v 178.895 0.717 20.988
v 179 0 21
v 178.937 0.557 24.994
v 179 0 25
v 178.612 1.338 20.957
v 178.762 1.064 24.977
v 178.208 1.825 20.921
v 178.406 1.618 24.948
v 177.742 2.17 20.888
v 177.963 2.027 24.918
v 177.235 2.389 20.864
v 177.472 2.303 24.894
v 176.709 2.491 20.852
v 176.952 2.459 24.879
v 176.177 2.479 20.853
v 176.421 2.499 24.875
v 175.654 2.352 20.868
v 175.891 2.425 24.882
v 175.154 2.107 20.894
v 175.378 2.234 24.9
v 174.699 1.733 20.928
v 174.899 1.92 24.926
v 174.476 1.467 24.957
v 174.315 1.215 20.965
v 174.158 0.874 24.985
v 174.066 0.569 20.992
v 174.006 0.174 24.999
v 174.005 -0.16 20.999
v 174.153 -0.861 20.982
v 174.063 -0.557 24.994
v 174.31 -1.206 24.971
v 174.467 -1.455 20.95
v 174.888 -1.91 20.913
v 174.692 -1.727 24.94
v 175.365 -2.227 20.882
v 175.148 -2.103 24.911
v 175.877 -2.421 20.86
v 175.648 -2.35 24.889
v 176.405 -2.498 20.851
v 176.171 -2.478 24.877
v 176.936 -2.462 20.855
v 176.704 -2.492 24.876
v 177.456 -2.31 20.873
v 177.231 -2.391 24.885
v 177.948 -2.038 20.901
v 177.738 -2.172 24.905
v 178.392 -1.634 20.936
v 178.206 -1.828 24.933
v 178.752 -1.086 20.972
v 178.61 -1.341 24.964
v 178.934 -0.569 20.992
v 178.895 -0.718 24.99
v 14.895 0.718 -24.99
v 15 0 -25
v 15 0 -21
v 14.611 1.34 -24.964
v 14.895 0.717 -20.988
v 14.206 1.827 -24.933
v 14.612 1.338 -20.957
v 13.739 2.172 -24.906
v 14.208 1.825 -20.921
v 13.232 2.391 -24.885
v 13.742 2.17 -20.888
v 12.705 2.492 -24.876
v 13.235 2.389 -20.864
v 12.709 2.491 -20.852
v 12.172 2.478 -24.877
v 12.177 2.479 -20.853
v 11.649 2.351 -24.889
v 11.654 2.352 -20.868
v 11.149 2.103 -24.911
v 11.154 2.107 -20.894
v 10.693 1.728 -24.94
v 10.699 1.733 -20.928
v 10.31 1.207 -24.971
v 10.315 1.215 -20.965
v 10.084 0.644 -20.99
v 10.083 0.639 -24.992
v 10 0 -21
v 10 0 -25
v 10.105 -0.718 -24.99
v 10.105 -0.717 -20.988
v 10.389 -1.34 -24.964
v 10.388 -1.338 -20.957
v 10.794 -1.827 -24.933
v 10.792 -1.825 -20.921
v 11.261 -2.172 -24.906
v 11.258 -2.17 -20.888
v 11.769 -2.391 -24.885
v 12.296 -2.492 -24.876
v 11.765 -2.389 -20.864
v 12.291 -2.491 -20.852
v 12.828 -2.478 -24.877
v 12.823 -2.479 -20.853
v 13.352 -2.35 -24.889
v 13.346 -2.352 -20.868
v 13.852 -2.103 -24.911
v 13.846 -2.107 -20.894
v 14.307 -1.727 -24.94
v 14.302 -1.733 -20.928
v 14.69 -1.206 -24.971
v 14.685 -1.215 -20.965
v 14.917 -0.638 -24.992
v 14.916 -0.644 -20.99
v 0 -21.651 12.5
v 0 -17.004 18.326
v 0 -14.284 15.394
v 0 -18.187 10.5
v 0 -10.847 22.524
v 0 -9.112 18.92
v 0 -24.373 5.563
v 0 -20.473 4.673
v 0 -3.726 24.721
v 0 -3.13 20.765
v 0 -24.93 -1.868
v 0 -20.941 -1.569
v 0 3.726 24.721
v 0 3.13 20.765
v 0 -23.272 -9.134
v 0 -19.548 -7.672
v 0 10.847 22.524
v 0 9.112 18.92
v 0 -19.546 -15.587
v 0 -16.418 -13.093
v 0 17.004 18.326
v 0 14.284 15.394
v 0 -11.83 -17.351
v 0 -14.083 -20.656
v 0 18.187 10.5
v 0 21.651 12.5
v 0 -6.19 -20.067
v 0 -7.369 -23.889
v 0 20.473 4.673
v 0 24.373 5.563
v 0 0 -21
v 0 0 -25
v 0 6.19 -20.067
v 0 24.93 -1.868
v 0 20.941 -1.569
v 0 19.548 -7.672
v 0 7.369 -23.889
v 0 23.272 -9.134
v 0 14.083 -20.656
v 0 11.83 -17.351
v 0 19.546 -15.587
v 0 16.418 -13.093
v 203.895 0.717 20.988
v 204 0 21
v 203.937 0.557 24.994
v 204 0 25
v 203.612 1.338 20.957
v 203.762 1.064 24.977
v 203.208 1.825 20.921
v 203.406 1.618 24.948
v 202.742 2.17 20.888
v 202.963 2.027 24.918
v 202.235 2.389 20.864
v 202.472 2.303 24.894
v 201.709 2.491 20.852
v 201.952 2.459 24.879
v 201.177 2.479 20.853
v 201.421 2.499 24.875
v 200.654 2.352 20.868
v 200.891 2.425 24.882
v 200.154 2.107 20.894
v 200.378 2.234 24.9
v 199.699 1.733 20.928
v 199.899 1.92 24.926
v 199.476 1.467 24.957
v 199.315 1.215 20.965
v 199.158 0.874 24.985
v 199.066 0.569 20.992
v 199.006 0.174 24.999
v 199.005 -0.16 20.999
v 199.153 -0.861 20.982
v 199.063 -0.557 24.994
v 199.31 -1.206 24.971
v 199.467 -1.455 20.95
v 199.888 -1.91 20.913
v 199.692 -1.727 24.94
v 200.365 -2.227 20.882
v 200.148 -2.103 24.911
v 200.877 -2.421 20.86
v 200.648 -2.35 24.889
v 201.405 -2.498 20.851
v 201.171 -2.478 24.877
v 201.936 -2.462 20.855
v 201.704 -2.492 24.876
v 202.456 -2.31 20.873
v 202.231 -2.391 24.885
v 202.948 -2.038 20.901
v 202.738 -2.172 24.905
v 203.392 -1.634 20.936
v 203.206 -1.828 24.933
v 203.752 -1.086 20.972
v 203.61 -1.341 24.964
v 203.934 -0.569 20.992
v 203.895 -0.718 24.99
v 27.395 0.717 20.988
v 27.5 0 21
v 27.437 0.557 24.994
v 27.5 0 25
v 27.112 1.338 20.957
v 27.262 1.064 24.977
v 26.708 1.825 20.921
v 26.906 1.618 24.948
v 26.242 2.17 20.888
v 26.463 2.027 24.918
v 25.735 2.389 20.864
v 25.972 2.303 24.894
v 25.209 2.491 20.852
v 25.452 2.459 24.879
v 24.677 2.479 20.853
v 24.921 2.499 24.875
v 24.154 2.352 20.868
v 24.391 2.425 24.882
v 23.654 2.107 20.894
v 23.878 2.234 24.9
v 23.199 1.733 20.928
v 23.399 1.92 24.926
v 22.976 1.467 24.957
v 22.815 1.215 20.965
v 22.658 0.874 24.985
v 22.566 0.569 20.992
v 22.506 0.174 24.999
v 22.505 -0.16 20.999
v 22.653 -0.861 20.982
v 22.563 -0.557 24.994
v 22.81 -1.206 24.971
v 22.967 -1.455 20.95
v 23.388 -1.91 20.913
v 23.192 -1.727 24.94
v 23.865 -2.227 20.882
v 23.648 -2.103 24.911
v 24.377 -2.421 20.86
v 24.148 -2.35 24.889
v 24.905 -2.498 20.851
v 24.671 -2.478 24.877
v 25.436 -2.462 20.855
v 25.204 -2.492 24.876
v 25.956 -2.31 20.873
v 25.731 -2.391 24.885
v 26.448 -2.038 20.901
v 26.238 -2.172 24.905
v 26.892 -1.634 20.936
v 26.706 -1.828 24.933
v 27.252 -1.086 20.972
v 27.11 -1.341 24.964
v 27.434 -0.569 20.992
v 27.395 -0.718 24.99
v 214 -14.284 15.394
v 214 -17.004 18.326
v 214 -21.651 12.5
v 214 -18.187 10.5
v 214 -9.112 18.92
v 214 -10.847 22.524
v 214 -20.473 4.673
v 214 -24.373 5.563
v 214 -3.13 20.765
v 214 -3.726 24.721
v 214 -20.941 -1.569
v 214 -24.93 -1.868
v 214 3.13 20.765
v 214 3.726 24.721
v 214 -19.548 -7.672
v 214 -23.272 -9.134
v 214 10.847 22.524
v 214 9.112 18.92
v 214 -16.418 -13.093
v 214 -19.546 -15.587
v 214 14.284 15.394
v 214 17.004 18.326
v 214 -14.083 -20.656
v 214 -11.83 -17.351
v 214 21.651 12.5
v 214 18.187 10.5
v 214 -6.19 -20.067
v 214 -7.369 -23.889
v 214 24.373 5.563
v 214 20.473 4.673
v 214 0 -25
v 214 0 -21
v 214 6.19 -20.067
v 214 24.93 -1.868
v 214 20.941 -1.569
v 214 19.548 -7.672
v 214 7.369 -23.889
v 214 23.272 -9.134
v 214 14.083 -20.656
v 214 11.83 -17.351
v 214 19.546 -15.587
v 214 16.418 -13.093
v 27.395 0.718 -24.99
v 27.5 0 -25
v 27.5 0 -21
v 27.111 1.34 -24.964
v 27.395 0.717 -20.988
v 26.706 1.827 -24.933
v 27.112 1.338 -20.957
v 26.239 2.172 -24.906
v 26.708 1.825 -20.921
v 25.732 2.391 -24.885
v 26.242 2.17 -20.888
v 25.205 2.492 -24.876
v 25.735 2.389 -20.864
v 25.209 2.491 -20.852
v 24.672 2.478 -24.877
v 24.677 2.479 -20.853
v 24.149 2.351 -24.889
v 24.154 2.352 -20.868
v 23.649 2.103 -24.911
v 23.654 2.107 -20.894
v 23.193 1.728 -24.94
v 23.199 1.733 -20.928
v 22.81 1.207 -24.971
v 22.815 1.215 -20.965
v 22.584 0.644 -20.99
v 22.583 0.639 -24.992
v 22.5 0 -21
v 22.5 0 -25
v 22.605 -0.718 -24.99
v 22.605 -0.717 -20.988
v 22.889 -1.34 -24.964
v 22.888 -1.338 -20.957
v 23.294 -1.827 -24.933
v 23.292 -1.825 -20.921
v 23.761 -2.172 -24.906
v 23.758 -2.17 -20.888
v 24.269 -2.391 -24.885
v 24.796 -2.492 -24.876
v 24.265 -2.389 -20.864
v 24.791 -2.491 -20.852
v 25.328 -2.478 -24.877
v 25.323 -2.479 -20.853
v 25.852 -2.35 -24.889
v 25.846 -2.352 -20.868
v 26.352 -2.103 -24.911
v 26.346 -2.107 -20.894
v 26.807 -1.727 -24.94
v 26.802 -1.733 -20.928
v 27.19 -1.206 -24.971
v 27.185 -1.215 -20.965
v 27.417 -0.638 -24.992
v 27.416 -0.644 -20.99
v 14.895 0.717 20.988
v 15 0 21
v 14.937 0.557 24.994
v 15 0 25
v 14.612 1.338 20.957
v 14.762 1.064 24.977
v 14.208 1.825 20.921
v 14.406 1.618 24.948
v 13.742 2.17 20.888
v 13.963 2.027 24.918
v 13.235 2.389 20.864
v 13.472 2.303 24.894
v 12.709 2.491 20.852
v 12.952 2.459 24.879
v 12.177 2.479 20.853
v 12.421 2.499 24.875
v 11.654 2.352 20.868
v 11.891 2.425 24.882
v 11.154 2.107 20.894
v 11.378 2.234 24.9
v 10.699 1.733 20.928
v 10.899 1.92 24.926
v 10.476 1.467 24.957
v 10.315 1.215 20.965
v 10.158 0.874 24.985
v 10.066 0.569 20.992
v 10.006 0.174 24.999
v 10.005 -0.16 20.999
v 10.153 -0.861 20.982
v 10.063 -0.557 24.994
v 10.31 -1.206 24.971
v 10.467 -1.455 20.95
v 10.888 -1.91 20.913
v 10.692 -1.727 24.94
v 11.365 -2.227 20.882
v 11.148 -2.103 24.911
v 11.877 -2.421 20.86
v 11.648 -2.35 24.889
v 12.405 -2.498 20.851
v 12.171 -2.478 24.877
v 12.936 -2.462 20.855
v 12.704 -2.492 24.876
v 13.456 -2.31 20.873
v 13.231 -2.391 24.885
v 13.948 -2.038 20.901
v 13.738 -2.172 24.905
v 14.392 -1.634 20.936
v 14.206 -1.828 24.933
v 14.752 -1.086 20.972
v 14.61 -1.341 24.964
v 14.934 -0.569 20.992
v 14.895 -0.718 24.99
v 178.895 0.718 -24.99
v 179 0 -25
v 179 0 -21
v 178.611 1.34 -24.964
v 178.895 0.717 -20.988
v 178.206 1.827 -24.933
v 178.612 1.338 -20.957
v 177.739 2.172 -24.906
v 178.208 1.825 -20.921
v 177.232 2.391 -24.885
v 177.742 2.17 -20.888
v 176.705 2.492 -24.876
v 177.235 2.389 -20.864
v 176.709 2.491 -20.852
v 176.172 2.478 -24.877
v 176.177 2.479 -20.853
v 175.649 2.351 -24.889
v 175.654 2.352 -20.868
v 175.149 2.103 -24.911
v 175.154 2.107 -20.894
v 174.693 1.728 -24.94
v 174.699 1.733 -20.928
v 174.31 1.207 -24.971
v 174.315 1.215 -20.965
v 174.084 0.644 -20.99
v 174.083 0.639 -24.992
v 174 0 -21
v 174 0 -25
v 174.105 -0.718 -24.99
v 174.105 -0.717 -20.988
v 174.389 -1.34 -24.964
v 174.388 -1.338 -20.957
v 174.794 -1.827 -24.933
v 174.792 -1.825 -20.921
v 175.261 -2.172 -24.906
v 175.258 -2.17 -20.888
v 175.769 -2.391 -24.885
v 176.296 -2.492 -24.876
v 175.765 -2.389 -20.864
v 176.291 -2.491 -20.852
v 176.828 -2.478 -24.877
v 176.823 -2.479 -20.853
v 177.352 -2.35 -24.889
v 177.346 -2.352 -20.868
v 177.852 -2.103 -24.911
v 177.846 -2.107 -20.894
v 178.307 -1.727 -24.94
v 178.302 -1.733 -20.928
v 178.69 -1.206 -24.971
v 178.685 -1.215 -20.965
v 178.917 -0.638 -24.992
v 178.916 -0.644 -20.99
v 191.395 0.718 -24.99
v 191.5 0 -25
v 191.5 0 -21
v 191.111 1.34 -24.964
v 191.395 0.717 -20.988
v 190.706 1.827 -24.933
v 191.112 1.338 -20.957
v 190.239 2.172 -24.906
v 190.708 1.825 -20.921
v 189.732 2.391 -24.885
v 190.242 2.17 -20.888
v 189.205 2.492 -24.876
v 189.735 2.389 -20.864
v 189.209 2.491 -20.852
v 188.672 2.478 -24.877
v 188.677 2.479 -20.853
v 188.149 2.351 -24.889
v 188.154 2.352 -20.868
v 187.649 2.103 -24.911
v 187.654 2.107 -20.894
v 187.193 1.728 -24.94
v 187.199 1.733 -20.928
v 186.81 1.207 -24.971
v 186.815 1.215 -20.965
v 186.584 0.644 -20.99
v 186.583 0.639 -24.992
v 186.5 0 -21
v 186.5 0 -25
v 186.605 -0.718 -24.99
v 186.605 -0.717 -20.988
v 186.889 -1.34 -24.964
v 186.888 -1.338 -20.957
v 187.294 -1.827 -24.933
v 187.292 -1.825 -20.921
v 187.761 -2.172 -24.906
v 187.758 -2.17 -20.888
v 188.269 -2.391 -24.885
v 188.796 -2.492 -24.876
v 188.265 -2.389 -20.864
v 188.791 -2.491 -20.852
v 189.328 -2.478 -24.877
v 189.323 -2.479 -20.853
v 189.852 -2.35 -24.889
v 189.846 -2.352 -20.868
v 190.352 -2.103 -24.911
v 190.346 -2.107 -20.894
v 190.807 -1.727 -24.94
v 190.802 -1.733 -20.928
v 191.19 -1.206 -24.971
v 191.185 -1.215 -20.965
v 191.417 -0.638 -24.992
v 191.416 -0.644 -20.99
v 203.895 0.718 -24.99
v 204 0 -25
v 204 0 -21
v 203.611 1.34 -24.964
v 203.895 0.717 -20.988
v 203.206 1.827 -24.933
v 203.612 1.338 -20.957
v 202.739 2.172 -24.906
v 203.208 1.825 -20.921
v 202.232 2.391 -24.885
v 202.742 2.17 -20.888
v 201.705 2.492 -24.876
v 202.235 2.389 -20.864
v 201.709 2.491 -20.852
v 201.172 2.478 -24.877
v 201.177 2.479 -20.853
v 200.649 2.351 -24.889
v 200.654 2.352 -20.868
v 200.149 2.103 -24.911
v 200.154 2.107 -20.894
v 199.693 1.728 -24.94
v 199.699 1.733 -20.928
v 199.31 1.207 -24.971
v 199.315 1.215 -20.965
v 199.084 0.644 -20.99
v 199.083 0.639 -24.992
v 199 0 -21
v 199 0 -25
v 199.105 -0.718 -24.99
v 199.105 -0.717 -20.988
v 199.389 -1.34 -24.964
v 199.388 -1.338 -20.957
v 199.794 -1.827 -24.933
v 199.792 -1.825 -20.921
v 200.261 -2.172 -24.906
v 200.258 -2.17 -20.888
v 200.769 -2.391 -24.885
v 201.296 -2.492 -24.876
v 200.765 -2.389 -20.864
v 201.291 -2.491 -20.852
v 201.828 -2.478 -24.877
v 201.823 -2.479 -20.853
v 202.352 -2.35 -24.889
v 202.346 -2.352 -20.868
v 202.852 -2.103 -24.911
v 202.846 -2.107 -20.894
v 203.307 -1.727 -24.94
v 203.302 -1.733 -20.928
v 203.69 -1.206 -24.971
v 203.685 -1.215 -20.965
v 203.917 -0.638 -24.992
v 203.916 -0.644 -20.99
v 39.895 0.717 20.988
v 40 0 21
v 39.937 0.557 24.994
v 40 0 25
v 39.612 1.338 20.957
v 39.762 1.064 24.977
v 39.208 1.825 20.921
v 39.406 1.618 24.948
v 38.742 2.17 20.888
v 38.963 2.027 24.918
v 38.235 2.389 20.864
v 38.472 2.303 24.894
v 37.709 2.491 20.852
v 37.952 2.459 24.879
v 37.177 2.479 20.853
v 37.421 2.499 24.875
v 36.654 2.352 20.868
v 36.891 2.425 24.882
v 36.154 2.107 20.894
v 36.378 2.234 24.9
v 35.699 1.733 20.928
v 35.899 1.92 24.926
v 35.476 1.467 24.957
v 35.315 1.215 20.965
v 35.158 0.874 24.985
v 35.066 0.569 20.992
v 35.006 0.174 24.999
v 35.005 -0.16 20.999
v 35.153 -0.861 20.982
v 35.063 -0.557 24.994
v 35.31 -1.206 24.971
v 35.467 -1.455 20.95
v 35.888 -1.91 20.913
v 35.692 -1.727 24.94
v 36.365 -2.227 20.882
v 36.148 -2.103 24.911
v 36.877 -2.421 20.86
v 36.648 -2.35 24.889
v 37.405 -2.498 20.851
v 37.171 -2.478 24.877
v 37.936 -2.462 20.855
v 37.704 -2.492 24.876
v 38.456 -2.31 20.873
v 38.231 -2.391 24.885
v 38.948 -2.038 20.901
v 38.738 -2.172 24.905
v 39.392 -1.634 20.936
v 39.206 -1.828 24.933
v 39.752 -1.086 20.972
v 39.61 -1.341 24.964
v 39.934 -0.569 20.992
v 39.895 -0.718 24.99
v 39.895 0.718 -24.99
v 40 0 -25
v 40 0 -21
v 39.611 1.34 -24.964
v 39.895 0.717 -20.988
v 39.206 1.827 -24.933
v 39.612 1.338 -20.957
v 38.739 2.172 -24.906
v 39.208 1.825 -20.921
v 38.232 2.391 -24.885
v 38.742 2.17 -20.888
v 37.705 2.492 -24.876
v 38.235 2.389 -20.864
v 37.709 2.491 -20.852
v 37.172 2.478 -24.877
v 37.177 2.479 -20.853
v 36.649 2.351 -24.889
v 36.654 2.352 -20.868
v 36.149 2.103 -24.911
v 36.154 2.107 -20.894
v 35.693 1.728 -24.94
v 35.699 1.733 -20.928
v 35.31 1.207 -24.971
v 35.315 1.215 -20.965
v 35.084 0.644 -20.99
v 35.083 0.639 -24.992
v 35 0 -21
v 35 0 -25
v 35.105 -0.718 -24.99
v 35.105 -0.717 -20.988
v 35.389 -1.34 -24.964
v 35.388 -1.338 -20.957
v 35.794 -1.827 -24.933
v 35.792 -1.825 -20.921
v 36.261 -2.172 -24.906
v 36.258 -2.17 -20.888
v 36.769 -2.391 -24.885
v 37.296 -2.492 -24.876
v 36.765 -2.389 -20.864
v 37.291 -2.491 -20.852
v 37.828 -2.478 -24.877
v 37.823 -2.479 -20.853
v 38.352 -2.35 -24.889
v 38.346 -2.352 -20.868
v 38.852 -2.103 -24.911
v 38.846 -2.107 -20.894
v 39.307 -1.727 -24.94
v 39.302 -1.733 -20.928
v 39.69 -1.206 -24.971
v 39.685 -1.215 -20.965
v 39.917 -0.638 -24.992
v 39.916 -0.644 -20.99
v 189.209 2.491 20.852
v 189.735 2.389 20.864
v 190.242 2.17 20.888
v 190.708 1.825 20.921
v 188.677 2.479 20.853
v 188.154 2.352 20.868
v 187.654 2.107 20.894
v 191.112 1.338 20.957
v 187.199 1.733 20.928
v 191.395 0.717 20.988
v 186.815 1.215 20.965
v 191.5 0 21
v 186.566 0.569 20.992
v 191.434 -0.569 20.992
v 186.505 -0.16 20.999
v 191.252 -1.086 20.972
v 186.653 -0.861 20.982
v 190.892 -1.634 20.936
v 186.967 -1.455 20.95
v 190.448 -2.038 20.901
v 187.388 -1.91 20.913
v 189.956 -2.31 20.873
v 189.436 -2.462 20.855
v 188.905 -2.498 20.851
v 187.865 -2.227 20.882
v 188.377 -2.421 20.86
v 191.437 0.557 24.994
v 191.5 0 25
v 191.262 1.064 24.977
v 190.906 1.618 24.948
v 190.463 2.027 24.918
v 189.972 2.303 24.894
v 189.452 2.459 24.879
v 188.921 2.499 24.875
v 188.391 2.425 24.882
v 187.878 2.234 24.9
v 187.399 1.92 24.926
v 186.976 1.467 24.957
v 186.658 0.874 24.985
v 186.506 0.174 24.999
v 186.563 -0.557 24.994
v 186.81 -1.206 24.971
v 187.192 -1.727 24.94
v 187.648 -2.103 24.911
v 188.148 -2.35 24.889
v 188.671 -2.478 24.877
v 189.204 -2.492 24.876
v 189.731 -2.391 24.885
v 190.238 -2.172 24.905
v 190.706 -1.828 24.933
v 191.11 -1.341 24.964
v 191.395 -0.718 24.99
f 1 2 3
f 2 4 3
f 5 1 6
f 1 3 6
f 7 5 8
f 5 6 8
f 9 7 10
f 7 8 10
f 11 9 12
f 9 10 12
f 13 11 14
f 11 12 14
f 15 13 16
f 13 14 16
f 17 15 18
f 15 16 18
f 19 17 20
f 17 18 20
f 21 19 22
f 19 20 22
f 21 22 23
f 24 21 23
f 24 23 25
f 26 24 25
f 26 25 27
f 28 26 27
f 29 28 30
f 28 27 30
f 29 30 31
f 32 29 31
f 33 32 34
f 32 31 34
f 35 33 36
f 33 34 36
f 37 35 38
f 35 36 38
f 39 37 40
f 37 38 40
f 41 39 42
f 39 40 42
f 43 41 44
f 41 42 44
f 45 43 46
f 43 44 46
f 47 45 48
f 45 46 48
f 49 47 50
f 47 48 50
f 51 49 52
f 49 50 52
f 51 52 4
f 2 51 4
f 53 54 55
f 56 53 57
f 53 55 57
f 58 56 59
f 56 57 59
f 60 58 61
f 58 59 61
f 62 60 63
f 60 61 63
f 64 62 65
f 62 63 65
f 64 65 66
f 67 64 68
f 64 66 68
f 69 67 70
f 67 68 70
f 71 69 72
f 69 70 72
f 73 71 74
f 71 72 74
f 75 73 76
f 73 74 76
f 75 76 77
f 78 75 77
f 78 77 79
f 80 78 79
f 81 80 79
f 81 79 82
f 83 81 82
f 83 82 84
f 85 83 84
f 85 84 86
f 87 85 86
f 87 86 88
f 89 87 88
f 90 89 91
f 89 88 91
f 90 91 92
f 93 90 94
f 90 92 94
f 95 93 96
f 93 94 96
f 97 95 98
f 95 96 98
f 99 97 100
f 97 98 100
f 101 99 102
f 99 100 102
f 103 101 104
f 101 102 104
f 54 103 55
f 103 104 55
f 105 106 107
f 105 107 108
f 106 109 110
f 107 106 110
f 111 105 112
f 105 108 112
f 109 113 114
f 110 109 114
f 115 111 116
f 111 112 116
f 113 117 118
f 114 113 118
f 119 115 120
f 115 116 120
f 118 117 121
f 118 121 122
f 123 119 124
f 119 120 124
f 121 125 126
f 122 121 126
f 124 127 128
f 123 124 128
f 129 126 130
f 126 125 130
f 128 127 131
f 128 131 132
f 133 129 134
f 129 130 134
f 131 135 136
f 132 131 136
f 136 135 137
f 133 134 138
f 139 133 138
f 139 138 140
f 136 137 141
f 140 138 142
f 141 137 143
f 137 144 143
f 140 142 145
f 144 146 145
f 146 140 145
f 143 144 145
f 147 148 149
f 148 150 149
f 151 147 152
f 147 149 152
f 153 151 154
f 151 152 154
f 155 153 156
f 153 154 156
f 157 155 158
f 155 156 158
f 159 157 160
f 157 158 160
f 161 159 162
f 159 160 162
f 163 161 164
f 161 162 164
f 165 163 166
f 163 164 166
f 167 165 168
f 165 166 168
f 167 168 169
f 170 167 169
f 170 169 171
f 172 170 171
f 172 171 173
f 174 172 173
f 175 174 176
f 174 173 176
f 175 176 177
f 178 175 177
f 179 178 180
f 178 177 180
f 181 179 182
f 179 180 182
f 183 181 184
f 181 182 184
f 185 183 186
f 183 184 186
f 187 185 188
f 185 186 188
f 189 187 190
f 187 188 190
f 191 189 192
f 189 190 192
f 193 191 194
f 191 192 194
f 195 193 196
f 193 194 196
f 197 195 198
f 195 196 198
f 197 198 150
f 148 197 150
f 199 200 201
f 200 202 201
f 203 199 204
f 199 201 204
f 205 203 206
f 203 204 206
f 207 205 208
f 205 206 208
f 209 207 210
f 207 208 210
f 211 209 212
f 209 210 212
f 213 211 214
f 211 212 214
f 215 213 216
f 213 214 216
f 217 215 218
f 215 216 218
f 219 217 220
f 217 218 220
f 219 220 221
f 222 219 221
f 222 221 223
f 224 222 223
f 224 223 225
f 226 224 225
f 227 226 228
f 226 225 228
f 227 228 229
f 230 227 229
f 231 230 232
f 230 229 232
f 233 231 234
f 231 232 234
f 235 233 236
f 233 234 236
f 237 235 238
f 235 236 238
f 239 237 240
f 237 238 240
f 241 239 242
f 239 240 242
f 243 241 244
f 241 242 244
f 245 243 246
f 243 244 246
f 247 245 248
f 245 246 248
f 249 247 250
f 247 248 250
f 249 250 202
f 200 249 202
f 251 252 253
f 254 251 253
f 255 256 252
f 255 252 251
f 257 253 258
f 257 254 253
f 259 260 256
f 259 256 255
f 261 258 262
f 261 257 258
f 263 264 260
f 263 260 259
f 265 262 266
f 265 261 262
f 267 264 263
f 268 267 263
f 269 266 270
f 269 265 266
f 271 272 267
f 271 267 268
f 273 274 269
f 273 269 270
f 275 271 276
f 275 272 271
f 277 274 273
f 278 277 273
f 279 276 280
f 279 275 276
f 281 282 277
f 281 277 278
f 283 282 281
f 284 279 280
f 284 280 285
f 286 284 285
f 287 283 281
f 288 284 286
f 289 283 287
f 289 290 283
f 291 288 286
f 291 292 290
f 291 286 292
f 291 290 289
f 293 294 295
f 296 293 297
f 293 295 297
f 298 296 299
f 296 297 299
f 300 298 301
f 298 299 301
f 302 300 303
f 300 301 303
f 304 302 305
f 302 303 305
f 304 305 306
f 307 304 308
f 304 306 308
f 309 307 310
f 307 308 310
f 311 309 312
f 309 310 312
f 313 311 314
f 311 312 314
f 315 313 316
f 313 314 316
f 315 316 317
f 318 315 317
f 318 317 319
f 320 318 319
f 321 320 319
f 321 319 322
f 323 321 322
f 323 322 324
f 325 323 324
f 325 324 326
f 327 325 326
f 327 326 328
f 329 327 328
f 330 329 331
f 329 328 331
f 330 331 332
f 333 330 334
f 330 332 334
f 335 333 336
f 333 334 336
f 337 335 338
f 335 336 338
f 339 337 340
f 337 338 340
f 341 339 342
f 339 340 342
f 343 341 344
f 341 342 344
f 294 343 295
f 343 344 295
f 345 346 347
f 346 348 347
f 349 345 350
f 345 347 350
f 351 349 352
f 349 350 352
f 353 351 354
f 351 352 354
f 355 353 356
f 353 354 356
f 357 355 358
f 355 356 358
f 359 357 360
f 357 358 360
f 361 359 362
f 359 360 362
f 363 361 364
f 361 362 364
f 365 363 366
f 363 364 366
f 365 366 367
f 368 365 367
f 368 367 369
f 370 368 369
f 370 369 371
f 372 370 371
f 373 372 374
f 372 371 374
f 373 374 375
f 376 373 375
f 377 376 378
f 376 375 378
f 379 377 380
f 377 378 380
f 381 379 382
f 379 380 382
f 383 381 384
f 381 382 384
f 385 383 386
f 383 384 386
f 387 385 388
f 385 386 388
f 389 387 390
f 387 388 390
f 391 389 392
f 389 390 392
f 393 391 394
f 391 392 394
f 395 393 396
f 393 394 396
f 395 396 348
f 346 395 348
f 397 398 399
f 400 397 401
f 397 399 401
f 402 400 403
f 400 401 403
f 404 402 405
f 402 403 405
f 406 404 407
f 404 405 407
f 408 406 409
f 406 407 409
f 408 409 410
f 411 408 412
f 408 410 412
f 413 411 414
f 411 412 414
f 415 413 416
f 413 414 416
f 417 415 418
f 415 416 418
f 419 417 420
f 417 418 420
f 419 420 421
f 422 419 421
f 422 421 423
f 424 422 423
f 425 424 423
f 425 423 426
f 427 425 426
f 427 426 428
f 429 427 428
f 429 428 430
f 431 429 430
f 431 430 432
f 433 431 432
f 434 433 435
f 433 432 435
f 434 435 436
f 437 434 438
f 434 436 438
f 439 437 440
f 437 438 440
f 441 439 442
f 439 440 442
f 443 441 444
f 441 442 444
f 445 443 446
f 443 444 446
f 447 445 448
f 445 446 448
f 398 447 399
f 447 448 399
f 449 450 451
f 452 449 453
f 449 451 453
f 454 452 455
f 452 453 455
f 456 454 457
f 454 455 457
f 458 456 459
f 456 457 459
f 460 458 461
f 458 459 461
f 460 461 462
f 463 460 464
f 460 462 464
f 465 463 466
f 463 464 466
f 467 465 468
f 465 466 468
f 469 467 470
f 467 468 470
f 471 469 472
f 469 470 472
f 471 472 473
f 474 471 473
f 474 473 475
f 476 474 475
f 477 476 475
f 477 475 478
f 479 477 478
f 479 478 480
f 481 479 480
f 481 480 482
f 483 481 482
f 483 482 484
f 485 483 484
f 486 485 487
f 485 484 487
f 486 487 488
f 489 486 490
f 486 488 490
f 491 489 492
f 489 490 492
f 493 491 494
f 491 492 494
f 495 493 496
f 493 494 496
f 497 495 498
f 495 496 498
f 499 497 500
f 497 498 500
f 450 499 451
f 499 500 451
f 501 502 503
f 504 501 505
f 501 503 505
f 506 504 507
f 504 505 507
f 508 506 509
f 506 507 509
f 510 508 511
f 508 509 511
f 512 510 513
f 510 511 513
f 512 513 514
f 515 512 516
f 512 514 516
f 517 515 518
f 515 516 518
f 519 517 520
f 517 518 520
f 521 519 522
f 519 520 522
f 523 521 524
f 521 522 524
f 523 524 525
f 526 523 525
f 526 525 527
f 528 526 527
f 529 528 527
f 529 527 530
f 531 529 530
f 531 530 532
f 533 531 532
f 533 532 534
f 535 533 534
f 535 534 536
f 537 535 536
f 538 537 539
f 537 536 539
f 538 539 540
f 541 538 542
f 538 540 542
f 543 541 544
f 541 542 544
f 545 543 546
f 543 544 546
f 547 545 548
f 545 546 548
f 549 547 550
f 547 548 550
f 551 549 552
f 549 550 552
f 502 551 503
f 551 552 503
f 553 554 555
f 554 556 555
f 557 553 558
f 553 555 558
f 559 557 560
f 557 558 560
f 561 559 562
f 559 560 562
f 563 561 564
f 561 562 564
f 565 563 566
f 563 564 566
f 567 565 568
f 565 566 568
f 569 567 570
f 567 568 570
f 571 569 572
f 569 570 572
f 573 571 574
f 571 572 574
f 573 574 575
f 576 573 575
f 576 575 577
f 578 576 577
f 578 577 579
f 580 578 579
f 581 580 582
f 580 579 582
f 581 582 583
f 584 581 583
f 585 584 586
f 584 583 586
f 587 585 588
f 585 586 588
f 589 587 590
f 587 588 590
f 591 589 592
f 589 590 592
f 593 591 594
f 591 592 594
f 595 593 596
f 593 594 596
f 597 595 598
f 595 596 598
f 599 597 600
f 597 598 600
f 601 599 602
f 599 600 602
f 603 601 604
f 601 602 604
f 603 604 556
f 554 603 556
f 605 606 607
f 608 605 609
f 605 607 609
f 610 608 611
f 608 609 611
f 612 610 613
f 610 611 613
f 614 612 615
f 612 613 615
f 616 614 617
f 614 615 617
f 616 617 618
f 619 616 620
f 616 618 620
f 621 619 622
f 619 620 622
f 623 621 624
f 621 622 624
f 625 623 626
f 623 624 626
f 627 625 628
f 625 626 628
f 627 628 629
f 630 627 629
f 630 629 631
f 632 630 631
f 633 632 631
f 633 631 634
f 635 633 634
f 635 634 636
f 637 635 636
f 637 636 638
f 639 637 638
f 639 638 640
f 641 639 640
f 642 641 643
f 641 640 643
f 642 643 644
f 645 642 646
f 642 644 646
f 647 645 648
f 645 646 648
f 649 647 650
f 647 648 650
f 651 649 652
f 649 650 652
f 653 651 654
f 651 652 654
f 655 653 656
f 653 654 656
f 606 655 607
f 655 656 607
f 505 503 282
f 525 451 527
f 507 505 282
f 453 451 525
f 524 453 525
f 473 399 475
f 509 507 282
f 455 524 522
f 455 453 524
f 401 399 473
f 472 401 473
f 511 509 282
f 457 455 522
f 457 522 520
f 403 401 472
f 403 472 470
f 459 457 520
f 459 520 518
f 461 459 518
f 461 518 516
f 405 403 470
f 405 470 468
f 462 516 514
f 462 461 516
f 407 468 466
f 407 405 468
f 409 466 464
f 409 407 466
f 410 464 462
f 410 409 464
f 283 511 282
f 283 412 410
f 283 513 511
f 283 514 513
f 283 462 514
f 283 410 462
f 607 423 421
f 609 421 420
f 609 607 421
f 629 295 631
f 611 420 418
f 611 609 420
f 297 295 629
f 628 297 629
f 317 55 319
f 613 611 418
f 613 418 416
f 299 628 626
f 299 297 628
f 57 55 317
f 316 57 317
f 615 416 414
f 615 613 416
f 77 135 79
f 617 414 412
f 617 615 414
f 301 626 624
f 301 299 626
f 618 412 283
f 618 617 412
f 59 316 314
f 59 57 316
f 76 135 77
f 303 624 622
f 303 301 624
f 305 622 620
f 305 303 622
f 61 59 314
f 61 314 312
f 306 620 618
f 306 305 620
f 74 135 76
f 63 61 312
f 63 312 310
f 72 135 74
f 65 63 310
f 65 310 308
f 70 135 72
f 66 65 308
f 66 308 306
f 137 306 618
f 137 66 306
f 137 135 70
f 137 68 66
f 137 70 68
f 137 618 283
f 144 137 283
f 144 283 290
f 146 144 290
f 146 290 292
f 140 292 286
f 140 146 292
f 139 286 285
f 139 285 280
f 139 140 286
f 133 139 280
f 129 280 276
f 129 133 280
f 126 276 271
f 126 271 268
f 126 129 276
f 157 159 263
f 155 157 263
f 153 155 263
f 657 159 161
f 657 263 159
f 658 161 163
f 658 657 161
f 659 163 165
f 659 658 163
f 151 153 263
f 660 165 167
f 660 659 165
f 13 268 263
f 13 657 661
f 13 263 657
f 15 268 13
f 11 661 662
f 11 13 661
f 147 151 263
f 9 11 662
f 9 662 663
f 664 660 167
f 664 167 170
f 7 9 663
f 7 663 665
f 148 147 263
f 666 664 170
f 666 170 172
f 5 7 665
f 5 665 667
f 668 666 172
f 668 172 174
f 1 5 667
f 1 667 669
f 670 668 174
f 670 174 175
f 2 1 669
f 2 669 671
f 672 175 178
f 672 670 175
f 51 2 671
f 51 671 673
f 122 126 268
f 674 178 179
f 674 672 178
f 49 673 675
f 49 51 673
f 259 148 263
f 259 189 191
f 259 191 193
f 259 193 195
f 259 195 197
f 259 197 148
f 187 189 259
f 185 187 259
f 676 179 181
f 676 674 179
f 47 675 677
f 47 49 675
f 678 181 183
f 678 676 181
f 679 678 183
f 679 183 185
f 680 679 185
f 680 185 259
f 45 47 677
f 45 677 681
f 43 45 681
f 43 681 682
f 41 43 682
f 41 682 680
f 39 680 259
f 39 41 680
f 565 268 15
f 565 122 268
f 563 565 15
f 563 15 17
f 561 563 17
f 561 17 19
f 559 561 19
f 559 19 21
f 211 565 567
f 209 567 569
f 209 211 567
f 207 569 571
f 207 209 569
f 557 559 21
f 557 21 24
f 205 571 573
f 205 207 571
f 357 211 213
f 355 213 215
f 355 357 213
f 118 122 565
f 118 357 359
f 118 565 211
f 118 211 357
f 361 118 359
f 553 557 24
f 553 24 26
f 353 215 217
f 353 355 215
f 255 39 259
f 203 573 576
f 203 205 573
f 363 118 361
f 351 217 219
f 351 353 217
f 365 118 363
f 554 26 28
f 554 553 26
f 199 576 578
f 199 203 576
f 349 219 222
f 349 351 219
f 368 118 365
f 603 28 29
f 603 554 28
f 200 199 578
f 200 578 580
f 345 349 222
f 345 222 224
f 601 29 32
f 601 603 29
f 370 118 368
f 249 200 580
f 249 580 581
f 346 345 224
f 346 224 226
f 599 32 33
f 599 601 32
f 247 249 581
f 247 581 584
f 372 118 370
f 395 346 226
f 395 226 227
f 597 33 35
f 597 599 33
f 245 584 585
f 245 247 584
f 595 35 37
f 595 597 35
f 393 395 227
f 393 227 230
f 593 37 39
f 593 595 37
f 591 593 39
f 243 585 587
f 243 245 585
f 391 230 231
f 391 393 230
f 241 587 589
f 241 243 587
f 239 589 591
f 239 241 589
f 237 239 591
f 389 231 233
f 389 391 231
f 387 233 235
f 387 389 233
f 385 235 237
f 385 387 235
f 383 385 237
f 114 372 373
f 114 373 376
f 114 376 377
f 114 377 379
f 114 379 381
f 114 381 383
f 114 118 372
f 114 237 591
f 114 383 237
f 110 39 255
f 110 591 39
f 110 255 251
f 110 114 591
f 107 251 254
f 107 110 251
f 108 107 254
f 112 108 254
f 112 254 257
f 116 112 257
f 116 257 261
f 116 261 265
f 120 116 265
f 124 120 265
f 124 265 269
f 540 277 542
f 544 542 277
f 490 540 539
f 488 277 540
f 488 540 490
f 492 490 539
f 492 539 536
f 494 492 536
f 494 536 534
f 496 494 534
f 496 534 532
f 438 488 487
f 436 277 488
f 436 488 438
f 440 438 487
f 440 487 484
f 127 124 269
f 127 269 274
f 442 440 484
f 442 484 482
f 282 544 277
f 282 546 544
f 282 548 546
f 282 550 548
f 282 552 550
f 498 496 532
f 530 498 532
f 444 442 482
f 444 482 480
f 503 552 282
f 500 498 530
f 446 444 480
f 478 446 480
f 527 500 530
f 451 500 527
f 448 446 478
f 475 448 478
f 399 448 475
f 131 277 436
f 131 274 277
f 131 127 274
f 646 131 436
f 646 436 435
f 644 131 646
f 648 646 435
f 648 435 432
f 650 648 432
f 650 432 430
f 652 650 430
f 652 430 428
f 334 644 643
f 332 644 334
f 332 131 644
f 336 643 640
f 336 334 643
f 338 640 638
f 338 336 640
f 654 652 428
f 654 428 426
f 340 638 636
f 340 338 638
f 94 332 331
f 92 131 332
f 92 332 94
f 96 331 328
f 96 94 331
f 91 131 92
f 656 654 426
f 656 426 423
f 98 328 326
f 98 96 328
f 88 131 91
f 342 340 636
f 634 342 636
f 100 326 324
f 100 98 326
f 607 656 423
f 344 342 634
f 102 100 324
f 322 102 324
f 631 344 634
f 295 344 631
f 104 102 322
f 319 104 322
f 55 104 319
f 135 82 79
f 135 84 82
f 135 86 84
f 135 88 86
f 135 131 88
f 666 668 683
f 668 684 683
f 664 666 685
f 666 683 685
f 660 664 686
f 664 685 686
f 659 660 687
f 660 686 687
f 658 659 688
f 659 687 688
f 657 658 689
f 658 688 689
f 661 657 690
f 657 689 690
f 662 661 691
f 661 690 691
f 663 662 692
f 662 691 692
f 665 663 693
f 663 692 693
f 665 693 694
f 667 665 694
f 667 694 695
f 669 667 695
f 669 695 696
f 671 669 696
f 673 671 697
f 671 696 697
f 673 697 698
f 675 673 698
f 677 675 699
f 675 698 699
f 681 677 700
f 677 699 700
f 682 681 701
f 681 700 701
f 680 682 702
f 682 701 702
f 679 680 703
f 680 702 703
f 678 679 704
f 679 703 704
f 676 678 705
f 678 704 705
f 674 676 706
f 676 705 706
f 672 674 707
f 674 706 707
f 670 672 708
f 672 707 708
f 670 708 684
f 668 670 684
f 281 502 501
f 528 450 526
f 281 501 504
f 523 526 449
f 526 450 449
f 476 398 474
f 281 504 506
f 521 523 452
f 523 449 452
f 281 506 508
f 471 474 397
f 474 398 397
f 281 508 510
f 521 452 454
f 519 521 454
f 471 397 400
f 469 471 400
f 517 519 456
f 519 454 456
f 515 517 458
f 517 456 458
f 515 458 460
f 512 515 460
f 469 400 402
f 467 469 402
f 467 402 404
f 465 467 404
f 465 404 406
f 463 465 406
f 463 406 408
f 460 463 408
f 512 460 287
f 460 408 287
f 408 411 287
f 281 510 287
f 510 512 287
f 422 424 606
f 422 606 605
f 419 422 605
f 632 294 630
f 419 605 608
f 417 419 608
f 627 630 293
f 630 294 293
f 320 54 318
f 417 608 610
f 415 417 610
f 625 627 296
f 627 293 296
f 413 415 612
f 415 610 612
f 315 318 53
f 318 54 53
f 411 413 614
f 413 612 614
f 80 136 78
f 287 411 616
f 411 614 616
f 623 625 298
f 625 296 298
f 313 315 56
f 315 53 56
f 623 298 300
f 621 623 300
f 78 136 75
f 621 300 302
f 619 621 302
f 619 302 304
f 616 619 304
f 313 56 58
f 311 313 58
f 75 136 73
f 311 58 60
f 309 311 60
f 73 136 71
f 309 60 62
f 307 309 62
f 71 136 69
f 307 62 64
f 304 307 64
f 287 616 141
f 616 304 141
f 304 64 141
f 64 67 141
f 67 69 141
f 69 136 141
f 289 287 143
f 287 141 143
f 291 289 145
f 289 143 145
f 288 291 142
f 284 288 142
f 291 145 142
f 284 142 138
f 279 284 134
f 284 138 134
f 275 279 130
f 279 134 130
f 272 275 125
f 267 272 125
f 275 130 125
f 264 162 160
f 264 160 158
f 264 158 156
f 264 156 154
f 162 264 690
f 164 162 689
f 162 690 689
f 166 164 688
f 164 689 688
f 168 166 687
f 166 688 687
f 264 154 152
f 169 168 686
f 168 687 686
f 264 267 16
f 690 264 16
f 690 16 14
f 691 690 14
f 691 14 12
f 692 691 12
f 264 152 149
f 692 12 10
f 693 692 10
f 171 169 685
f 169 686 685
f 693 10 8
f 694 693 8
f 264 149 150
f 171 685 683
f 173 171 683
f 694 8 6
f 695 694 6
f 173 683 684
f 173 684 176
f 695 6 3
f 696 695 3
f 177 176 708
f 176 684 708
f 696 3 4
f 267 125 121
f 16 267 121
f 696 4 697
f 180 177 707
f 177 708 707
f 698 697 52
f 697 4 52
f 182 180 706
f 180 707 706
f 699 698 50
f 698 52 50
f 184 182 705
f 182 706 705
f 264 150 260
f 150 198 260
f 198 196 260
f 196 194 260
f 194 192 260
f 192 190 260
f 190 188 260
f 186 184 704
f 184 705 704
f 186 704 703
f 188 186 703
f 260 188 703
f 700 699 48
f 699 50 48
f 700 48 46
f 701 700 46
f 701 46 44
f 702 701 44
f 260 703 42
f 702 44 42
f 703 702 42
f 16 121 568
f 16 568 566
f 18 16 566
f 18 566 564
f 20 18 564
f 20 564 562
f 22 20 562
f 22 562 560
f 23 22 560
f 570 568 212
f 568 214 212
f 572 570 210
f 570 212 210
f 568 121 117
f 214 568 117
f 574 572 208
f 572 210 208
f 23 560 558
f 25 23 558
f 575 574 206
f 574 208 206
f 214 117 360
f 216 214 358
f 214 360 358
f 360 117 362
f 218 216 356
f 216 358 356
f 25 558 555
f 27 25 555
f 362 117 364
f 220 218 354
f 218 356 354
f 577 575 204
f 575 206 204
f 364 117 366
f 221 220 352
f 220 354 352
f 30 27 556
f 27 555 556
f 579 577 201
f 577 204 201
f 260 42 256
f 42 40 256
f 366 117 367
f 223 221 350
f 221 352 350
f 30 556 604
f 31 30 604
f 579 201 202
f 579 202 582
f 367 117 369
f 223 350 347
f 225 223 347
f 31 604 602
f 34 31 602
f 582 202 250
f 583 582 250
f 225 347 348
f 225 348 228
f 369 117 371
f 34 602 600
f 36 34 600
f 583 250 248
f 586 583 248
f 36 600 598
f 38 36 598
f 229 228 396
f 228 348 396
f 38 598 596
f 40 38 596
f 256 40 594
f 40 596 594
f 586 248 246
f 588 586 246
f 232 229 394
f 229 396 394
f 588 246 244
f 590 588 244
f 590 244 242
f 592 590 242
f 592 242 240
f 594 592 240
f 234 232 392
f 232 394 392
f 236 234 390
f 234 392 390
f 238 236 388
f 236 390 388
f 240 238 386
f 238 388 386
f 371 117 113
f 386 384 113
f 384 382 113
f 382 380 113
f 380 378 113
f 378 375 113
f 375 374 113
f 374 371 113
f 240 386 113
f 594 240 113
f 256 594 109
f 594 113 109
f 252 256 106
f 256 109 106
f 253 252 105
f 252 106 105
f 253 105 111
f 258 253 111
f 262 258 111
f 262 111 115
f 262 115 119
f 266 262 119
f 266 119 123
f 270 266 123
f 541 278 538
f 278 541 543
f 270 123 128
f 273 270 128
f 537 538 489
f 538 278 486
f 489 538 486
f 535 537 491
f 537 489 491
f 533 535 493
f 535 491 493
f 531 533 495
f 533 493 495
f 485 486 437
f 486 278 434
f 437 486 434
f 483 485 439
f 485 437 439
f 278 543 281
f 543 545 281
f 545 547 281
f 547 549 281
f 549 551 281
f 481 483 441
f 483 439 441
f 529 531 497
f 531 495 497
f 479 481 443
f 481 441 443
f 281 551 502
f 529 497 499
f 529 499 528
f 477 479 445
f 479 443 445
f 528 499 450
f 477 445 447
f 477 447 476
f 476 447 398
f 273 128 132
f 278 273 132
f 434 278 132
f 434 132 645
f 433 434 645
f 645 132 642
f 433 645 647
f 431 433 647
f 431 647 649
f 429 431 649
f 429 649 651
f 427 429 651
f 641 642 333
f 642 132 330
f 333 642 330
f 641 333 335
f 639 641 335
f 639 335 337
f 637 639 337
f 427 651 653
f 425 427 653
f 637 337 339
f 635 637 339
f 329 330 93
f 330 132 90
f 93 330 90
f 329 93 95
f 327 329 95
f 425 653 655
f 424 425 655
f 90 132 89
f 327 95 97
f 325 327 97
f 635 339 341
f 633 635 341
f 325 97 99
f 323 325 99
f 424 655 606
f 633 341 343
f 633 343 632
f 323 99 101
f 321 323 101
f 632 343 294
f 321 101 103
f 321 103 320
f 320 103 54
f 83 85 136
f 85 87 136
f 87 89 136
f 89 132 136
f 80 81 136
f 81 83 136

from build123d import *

# Parameters (mm, degrees)
SKETCH_2_R               = 25
SKETCH_2_R_2             = 21
EXTRUDE_2_DEPTH          = 214
SKETCH_4_R               = 2.5
CUT_EXTRUDE_2_DEPTH      = 10
CUT_EXTRUDE_2_DEPTH_BACK = 51


with BuildPart() as part:
    # Эскиз2 → Бобышка-Вытянуть2 (new body)
    with BuildSketch(Plane(origin=(0, 0, 0), x_dir=(0, 0, -1), z_dir=(1, 0, 0))):
        Circle(SKETCH_2_R)
        Circle(SKETCH_2_R_2, mode=Mode.SUBTRACT)
    extrude(amount=EXTRUDE_2_DEPTH)

    # Эскиз4 → Вырез-Вытянуть2 (cut, two sides)
    with BuildSketch(Plane.XY.offset(25)) as cut_extrude_2_sk:
        with Locations((12.5, 0)):
            Circle(SKETCH_4_R)
        with Locations((201.5, 0)):
            Circle(SKETCH_4_R)
        with Locations((25, 0)):
            Circle(SKETCH_4_R)
        with Locations((37.5, 0)):
            Circle(SKETCH_4_R)
        with Locations((189, 0)):
            Circle(SKETCH_4_R)
        with Locations((176.5, 0)):
            Circle(SKETCH_4_R)
    extrude(amount=CUT_EXTRUDE_2_DEPTH, mode=Mode.SUBTRACT)
    extrude(cut_extrude_2_sk.sketch, amount=-CUT_EXTRUDE_2_DEPTH_BACK, mode=Mode.SUBTRACT)


solid = part.part
